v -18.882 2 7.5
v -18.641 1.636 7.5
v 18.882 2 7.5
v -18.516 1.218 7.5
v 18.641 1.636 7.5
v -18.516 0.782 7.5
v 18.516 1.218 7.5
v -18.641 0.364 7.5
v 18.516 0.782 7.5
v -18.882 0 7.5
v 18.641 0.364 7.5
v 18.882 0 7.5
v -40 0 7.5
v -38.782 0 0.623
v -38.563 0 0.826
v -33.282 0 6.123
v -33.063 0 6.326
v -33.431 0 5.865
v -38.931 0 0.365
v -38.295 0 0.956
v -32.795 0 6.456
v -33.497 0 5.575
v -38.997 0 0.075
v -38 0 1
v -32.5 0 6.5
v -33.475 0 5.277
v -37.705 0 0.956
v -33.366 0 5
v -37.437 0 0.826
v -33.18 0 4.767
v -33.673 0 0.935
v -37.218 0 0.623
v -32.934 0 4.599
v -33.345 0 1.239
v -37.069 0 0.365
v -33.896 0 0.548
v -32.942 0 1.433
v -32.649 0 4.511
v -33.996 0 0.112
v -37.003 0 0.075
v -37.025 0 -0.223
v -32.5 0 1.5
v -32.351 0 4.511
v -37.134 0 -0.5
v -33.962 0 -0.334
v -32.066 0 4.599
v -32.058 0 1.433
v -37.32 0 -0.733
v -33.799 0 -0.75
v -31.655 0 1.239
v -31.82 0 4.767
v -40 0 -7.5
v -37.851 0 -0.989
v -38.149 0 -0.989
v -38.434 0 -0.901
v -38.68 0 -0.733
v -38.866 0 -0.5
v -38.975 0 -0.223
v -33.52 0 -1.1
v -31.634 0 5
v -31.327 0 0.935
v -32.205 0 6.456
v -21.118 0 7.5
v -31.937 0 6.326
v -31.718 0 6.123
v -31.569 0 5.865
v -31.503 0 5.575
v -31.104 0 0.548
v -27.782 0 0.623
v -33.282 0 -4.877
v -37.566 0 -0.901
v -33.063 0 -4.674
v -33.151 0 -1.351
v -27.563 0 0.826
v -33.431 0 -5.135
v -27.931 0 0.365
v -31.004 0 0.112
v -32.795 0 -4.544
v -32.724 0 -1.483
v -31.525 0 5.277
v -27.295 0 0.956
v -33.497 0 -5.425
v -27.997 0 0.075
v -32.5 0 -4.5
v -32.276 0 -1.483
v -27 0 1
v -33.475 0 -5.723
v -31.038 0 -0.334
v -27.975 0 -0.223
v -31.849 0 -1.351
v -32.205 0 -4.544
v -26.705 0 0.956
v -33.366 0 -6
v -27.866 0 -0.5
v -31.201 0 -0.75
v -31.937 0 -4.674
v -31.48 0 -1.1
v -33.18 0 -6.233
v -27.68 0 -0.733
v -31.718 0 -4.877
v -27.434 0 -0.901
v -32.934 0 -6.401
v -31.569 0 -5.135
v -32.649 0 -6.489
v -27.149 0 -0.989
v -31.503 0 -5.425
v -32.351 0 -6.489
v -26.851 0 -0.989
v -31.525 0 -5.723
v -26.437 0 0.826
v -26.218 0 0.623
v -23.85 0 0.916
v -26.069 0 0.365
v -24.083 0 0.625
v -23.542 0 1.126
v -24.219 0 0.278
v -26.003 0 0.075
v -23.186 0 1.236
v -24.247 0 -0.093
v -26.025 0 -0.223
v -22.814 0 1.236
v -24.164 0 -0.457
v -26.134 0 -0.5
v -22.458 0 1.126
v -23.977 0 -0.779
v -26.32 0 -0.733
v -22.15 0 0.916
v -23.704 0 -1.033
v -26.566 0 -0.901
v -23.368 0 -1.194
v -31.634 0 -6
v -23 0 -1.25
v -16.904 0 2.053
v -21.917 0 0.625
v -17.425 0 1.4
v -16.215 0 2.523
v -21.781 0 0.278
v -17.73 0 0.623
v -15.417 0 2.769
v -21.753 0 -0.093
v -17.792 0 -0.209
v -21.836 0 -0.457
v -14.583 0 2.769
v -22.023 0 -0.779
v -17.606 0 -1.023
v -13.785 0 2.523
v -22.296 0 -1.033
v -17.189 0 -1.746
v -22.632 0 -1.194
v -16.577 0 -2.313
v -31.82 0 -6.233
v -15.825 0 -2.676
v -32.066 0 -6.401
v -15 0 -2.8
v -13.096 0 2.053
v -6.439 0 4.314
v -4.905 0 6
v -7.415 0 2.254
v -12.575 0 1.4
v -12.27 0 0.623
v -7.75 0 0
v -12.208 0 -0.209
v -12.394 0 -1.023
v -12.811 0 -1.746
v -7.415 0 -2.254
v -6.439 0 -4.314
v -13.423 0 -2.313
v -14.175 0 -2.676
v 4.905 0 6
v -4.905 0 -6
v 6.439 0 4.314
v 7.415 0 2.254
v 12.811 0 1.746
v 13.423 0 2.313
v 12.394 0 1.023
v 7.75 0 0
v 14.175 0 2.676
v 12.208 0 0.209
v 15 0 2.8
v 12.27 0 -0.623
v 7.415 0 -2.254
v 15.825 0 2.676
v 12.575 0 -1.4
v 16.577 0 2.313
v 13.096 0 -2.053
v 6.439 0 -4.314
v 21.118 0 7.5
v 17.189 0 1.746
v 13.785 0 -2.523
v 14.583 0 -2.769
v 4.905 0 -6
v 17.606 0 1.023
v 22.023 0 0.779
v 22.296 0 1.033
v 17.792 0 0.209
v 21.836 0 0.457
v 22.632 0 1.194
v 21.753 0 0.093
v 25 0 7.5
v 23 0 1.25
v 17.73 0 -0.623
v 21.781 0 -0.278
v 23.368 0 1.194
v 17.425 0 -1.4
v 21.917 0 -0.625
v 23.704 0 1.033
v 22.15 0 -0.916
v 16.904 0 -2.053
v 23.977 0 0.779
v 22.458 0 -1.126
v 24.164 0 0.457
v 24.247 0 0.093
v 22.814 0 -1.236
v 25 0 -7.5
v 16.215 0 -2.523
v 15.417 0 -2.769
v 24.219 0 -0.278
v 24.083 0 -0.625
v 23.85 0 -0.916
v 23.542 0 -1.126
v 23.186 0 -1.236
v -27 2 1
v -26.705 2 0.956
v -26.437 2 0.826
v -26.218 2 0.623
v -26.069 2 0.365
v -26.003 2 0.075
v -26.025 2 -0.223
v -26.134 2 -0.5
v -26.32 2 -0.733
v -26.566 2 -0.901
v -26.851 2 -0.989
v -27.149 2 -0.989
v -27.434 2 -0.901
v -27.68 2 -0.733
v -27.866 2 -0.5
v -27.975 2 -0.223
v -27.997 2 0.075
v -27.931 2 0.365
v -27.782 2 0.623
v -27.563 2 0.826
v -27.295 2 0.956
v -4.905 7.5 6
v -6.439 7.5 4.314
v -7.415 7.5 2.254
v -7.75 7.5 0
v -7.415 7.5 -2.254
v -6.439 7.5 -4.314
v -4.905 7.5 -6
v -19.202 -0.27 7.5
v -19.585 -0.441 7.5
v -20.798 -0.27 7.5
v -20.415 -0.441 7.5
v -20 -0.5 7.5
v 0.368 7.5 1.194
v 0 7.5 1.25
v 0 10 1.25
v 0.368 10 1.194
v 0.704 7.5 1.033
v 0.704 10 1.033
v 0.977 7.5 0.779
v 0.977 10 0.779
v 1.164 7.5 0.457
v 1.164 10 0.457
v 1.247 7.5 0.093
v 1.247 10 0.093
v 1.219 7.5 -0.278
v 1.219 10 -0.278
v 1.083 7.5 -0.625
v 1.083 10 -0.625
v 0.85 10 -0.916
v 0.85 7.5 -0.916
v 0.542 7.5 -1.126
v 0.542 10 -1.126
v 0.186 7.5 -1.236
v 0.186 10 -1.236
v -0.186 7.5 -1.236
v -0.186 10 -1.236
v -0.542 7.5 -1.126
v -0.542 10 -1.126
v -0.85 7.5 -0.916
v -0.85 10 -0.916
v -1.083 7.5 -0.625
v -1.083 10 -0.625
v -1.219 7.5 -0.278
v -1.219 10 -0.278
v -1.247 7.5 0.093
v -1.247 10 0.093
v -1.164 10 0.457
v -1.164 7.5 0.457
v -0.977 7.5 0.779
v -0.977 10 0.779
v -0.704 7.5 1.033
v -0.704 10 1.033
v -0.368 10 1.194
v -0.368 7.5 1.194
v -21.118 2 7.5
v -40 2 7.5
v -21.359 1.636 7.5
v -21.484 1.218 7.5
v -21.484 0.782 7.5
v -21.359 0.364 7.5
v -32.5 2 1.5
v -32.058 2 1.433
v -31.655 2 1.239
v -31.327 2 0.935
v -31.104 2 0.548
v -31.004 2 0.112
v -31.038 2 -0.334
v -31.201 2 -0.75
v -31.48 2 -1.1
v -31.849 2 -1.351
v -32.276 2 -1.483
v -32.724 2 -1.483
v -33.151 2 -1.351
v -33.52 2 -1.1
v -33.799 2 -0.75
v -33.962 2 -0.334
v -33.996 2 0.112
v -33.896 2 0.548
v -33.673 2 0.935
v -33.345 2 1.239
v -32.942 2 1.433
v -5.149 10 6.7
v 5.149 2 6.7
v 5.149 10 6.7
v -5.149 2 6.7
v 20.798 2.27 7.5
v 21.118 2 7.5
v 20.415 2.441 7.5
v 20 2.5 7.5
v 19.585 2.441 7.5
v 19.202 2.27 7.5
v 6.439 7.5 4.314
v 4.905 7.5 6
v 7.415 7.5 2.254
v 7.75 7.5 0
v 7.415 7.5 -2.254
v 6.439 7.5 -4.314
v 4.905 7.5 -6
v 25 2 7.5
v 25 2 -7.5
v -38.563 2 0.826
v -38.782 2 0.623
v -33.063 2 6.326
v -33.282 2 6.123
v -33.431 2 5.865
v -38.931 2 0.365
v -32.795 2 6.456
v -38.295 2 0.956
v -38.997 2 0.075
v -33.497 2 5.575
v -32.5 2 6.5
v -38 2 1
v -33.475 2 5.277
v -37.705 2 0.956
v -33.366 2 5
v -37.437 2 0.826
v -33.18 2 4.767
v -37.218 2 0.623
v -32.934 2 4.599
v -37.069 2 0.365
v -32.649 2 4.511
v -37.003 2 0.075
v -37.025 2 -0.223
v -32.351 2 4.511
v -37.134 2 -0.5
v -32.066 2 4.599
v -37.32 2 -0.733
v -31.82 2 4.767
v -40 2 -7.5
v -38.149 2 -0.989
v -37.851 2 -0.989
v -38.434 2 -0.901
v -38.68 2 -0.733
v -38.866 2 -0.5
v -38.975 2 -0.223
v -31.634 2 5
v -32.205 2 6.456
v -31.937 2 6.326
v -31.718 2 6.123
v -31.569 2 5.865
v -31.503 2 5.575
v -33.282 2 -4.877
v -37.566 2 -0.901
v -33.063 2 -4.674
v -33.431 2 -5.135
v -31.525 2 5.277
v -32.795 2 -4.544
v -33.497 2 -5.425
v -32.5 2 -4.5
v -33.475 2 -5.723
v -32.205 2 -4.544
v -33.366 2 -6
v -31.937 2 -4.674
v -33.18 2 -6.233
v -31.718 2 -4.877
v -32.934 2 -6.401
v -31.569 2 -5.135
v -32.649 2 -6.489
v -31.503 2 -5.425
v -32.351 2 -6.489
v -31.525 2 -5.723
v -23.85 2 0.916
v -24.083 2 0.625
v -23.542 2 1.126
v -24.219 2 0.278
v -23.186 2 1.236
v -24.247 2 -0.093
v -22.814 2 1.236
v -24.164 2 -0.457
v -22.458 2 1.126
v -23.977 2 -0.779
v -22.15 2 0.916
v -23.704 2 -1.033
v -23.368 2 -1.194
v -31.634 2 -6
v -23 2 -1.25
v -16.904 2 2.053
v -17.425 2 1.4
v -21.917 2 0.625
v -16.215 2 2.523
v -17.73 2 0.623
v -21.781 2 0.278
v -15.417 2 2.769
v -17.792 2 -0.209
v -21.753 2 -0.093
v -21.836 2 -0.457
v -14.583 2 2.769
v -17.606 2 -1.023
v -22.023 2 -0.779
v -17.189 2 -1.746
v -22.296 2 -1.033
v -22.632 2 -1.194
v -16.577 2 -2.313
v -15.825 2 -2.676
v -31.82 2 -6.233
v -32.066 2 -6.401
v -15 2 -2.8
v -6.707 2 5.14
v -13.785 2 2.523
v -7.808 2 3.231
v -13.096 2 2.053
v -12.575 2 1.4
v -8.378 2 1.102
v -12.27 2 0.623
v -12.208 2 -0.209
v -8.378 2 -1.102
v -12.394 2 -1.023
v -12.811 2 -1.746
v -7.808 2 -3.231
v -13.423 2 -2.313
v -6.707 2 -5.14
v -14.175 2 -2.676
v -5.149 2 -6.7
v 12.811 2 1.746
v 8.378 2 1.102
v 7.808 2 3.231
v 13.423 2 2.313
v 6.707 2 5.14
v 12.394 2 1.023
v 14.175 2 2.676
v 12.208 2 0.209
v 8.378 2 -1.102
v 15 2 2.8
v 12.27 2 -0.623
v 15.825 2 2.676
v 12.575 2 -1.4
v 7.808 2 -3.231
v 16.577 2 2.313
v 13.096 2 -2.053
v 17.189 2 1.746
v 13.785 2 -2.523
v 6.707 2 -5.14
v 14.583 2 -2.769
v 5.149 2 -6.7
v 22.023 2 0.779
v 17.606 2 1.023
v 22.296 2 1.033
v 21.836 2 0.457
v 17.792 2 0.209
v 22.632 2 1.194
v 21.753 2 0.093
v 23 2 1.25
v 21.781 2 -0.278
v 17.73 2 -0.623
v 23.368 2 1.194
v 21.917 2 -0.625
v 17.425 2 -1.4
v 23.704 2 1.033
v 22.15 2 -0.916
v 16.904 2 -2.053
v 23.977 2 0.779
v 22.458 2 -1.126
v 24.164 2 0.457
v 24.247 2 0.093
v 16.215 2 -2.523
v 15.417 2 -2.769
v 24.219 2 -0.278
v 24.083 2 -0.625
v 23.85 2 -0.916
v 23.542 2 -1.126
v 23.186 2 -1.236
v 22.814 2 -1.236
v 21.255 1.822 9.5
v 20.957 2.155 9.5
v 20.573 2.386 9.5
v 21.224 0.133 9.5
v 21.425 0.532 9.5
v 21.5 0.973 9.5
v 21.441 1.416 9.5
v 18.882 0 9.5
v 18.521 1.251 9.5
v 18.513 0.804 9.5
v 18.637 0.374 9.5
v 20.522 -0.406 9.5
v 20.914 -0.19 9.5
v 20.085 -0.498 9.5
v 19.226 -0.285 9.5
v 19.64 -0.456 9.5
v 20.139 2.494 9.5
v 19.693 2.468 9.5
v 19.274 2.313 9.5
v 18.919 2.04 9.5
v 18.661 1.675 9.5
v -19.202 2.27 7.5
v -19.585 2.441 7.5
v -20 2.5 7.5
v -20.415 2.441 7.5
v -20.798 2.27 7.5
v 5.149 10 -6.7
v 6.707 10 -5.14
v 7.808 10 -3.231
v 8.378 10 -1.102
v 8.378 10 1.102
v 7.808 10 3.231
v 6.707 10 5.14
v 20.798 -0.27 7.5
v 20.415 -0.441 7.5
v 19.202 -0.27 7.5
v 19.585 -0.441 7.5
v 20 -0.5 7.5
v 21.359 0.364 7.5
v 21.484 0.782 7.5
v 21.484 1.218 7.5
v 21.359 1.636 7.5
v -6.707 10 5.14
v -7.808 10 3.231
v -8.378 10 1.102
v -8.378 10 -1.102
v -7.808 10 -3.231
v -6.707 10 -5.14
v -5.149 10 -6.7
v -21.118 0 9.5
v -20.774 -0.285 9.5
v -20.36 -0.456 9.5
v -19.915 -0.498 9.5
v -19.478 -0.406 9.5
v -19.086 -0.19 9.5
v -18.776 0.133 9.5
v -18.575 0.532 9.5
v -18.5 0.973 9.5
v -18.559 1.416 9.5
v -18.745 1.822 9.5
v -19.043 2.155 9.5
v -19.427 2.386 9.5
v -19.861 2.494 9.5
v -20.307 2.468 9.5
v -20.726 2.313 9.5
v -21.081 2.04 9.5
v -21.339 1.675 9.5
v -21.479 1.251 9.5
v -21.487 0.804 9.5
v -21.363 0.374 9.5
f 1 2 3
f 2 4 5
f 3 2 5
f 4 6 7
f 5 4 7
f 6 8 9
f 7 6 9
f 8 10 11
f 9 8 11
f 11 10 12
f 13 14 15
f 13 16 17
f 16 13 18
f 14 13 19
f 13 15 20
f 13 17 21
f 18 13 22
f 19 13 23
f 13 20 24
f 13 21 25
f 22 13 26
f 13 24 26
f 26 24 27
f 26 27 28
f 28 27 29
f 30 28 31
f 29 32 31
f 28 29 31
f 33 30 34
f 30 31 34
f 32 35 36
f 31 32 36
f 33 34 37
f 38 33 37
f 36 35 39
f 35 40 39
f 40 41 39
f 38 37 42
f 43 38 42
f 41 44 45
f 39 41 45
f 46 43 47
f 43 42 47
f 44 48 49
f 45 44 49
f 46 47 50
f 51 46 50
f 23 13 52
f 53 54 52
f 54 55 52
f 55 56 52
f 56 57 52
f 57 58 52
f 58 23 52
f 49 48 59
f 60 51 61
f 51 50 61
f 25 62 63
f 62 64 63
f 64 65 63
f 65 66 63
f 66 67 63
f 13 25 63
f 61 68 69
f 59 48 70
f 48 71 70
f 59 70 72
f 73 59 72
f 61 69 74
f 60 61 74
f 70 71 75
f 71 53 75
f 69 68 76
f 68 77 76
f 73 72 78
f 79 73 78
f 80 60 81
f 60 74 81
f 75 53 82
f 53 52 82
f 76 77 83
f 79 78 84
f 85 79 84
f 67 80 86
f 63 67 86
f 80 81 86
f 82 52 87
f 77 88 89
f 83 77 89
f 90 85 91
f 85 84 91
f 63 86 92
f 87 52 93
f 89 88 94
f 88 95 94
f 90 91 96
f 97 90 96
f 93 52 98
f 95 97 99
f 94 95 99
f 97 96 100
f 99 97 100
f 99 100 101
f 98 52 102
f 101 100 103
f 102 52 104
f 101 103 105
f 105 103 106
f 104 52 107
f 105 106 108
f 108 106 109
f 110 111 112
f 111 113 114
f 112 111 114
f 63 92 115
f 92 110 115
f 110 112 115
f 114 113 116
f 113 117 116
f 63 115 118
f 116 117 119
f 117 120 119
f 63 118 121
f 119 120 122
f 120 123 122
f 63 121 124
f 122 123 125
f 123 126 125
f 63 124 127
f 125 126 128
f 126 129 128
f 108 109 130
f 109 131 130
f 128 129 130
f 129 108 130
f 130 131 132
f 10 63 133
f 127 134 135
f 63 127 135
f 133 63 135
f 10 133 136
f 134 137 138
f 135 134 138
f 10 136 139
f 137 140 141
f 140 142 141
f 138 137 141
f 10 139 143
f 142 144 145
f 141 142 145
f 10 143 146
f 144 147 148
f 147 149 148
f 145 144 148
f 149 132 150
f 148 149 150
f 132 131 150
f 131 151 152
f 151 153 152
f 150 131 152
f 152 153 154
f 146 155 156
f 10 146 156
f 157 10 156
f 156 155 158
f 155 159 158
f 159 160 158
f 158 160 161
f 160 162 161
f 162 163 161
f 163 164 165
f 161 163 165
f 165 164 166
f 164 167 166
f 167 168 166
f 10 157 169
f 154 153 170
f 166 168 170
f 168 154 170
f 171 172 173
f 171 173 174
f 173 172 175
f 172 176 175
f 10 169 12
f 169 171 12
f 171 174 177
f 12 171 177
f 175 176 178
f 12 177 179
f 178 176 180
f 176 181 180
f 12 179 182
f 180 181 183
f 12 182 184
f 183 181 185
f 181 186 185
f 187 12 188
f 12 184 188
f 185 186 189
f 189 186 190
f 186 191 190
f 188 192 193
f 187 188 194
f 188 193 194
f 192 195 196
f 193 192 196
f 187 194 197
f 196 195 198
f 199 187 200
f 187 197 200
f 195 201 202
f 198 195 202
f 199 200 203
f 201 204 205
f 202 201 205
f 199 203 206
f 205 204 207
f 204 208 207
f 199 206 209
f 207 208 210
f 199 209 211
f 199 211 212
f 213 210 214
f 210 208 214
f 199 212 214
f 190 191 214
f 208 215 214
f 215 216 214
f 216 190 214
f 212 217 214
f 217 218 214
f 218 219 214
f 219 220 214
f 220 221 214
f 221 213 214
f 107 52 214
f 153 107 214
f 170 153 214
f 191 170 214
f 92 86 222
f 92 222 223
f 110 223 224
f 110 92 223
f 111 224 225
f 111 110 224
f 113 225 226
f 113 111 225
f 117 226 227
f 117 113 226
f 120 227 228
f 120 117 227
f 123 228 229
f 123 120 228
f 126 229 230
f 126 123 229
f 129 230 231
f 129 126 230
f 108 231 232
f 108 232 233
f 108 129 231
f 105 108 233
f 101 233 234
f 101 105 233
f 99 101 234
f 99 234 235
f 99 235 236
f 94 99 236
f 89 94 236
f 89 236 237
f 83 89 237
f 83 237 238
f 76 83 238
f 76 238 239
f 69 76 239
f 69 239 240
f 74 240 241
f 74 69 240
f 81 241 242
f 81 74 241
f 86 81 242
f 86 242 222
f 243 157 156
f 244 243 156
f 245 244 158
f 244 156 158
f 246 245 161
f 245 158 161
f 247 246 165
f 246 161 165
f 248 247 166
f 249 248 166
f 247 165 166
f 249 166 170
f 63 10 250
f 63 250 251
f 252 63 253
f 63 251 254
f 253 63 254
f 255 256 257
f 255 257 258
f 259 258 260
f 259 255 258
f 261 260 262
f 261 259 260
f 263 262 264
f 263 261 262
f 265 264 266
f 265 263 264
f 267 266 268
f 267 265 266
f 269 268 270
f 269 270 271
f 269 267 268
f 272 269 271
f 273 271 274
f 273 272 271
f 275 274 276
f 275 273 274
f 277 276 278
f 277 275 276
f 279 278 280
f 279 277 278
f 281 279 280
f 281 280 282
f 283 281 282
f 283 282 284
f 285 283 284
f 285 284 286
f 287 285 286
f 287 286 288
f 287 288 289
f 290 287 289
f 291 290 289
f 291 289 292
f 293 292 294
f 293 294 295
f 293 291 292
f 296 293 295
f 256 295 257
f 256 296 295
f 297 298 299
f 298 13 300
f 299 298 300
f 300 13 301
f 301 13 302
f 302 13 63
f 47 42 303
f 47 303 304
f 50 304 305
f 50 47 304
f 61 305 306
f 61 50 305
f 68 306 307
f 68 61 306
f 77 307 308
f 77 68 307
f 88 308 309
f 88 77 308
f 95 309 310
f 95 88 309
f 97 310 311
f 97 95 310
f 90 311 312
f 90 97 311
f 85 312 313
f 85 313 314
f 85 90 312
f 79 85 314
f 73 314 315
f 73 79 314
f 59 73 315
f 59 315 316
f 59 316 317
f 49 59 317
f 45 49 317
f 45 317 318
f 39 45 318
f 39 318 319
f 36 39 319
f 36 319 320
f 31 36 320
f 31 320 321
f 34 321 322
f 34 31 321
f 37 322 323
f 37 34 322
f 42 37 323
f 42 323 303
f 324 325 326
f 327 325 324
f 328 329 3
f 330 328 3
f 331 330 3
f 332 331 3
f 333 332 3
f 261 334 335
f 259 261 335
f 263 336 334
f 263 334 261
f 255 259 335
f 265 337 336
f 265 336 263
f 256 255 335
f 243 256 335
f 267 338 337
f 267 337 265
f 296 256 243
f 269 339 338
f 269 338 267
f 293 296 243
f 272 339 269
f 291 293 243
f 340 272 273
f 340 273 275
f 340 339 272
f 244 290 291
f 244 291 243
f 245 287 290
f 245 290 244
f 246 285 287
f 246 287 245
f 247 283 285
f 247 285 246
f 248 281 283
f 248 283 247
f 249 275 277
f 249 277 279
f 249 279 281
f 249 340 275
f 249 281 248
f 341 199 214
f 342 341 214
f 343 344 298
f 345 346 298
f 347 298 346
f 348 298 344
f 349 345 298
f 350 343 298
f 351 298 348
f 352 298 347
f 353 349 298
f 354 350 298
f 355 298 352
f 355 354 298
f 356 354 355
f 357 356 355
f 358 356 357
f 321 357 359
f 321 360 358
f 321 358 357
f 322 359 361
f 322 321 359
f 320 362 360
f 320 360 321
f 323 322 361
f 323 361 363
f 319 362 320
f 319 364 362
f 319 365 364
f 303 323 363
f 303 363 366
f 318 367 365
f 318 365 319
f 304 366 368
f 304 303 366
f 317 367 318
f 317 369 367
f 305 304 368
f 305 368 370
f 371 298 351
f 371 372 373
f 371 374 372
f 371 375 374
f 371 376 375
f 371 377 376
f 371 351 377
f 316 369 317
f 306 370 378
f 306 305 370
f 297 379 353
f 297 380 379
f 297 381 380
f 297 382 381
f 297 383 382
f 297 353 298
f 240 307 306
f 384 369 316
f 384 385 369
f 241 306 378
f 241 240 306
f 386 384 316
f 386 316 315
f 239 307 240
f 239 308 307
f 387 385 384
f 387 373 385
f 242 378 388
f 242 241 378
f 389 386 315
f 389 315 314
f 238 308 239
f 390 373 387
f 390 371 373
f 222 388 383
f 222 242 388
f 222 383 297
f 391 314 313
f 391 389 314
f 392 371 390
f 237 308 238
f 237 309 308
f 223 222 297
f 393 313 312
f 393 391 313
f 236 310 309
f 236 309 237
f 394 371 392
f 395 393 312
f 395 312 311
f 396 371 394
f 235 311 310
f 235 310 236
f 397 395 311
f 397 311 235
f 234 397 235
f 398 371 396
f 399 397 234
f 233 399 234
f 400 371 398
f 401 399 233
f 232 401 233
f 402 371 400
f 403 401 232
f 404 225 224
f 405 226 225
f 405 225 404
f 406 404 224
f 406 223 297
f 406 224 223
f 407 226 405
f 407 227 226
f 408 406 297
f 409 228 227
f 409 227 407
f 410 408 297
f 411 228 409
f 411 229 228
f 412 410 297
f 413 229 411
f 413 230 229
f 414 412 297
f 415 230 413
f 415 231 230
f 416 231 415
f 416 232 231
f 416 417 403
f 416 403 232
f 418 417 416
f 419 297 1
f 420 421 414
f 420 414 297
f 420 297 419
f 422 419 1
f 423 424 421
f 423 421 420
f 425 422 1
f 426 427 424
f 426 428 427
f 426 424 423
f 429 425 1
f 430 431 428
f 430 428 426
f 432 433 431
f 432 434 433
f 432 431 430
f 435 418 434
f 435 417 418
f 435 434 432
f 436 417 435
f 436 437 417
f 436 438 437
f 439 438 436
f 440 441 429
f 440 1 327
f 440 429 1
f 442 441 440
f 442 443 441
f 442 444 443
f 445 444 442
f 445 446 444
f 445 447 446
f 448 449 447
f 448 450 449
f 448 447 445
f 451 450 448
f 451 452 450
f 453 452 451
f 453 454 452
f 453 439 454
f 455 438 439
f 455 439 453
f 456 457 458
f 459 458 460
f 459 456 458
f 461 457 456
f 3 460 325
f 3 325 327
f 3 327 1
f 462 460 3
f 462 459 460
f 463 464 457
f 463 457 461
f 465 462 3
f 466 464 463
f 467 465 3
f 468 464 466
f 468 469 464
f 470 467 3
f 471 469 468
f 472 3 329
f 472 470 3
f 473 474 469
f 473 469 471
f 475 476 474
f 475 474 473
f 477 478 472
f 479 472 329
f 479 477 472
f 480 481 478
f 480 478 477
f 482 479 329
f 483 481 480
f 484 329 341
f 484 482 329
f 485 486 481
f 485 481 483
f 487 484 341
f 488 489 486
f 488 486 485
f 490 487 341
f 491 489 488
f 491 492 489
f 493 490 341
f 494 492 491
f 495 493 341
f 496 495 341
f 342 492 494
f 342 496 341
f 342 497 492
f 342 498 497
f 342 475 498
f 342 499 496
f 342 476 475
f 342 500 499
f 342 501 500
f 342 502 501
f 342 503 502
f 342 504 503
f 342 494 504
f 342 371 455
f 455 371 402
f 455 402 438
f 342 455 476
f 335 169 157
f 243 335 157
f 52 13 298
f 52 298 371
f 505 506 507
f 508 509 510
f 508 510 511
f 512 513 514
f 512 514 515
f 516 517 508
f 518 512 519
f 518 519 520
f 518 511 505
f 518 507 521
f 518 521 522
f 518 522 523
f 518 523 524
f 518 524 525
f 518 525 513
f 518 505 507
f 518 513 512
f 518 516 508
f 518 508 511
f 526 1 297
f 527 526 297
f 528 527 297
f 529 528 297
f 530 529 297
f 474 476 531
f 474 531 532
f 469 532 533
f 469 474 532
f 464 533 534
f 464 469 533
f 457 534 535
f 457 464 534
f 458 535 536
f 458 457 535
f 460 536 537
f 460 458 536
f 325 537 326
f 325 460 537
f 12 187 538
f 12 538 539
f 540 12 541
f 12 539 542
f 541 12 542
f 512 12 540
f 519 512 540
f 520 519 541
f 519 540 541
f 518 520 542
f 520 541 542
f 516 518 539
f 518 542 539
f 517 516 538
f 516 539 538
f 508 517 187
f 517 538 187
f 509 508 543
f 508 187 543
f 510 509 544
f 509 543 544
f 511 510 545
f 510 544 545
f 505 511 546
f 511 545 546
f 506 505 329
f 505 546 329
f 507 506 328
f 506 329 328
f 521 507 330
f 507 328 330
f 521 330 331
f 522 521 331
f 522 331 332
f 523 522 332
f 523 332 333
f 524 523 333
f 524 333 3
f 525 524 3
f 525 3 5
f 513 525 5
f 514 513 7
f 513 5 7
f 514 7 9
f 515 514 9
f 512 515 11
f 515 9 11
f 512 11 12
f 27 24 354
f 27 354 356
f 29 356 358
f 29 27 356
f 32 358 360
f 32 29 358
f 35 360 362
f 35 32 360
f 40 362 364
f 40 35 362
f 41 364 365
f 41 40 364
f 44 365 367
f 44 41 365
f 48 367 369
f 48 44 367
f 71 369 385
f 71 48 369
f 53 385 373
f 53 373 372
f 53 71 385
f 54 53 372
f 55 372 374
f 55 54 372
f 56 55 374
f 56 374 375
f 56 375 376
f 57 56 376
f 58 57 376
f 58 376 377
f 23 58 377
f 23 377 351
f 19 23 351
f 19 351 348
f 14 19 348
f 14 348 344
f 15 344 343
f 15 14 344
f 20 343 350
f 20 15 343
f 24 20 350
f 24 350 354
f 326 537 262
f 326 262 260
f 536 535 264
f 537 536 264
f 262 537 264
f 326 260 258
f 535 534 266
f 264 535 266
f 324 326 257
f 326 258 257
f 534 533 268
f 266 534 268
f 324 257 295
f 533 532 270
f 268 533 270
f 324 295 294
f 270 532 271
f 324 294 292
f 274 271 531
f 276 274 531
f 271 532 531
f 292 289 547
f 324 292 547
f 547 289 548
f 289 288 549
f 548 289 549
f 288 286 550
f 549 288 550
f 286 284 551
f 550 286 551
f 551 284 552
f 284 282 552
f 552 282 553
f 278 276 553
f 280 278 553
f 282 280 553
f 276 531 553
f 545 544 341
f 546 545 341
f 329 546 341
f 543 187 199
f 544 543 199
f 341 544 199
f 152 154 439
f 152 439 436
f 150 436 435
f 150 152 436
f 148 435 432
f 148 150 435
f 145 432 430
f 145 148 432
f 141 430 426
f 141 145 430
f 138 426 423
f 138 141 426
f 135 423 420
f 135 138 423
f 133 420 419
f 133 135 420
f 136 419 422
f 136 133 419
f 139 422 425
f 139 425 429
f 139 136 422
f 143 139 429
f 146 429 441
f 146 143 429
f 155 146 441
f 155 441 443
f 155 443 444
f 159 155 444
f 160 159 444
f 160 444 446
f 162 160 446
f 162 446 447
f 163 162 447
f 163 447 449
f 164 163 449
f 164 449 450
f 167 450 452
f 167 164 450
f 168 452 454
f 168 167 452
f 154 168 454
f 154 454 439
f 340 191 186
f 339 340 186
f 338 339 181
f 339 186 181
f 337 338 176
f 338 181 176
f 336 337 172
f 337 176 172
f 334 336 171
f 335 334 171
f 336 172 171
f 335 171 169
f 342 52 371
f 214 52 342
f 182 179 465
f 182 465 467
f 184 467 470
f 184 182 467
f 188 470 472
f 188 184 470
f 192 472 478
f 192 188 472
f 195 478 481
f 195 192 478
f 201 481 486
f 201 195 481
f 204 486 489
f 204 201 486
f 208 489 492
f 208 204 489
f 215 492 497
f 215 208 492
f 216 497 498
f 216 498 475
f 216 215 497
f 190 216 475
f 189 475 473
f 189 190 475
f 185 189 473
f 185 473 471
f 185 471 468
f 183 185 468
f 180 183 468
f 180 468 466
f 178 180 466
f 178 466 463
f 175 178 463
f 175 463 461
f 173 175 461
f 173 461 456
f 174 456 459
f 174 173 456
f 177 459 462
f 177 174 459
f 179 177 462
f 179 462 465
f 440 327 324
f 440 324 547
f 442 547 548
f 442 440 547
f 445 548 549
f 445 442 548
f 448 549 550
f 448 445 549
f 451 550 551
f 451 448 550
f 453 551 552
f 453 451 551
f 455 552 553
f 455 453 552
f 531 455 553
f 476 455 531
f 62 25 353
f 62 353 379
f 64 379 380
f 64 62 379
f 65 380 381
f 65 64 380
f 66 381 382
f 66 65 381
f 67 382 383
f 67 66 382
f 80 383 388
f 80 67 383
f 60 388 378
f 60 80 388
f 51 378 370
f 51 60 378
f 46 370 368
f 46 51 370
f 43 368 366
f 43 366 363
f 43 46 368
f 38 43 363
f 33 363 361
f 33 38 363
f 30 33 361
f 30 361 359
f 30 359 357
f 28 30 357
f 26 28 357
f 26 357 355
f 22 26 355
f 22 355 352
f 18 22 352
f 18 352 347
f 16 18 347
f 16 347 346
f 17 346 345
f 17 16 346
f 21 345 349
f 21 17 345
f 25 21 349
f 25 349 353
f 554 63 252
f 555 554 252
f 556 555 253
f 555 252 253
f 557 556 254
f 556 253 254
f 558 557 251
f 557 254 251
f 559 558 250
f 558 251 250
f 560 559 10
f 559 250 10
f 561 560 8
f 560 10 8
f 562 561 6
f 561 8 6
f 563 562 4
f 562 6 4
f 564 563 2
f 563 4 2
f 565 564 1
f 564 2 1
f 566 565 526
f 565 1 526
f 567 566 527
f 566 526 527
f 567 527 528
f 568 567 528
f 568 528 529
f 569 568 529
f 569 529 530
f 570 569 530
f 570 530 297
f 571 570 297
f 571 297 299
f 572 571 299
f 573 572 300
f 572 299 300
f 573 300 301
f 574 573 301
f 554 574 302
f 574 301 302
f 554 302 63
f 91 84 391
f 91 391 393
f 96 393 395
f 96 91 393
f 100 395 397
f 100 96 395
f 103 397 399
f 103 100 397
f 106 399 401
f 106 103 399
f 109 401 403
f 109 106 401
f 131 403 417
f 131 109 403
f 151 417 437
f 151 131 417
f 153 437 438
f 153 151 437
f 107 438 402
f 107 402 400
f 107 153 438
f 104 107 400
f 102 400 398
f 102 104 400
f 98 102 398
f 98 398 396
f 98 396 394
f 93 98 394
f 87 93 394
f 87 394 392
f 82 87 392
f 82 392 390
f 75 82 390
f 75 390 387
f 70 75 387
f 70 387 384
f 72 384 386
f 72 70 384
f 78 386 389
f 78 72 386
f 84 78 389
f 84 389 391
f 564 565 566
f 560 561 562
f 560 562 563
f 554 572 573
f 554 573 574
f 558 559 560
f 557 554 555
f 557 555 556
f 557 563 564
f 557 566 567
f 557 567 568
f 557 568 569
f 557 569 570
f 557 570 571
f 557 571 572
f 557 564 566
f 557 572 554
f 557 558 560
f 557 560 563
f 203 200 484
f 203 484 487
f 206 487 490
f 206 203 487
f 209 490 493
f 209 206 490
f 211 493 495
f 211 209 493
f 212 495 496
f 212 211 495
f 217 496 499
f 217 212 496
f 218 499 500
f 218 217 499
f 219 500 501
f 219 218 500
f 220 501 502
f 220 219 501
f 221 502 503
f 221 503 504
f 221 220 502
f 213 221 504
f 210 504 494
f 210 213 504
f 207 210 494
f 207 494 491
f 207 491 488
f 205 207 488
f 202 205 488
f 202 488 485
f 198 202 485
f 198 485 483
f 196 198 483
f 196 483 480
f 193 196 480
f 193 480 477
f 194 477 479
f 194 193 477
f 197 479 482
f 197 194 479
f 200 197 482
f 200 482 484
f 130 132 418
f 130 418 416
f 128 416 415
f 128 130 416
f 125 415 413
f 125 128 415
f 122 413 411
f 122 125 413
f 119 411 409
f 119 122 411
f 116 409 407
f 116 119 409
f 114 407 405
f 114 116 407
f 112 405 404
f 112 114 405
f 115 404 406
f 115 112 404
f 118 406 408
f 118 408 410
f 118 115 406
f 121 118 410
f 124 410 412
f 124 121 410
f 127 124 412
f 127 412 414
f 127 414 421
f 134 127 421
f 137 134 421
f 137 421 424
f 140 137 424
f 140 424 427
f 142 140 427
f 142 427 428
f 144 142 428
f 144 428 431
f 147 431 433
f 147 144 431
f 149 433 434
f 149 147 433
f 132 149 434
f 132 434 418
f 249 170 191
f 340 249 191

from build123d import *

# Parameters (mm, degrees)
SKETCH_1_W               = 65
SKETCH_1_H               = 15
EXTRUDE_1_DEPTH          = 2
SKETCH_2_R               = 1.25
SKETCH_2_R_2             = 2.8
SKETCH_2_R_3             = 1.5
SKETCH_2_R_4             = 1
CUT_EXTRUDE_1_DEPTH      = 2
SKETCH_4_R               = 1.5
EXTRUDE_2_DEPTH          = 2
EXTRUDE_3_DEPTH          = 8
SKETCH_5_8_R             = 1.25
EXTRUDE_4_DEPTH          = 8
CUT_EXTRUDE_2_DEPTH      = 5.5
CUT_EXTRUDE_2_DEPTH_BACK = 42.883767739
SKETCH_5_11_R            = 1.25


with BuildPart() as part:
    # 草图1 → 凸台-拉伸1 (new body)
    with BuildSketch(Plane(origin=(0, 0, 0), x_dir=(1, 0, 0), z_dir=(0, 1, 0))):
        with Locations((-7.5, 0)):
            Rectangle(SKETCH_1_W, SKETCH_1_H)
    extrude(amount=EXTRUDE_1_DEPTH)

    # 草图2 → 切除-拉伸1 (cut)
    with BuildSketch(Plane(origin=(0, 0, 0), x_dir=(1, 0, 0), z_dir=(0, 1, 0))):
        with Locations(Location((0, 0, 0), (0, 0, 270))):
            Circle(SKETCH_2_R)
        with Locations(Location((15, 0, 0), (0, 0, 270))):
            Circle(SKETCH_2_R_2)
        with Locations(Location((-15, 0, 0), (0, 0, 90))):
            Circle(SKETCH_2_R_2)
        with Locations(Location((23, 0, 0), (0, 0, 270))):
            Circle(SKETCH_2_R)
        with Locations(Location((-23, 0, 0), (0, 0, 90))):
            Circle(SKETCH_2_R)
        with Locations(Location((-32.5, 0, 0), (0, 0, 270))):
            Circle(SKETCH_2_R_3)
        with Locations(Location((-27, 0, 0), (0, 0, 270))):
            Circle(SKETCH_2_R_4)
        with Locations(Location((-32.5, -5.5, 0), (0, 0, 270))):
            Circle(SKETCH_2_R_4)
        with Locations(Location((-38, 0, 0), (0, 0, 270))):
            Circle(SKETCH_2_R_4)
        with Locations(Location((-32.5, 5.5, 0), (0, 0, 270))):
            Circle(SKETCH_2_R_4)
    extrude(amount=CUT_EXTRUDE_1_DEPTH, mode=Mode.SUBTRACT)

    # 草图4 → 凸台-拉伸2 (add)
    with BuildSketch(Plane.XY.offset(7.5)):
        with Locations(Location((20, 1, 0), (0, 0, 221.810314896))):
            Circle(SKETCH_4_R)
        with Locations(Location((-20, 1, 0), (0, 0, 221.810314896))):
            Circle(SKETCH_4_R)
    extrude(amount=EXTRUDE_2_DEPTH)

    # 草图5 → 凸台-拉伸3 (add)
    with BuildSketch(Plane(origin=(0, 2, 0), x_dir=(1, 0, 0), z_dir=(0, 1, 0))):
        with BuildLine():
            Line((5.149029035, -6.7), (-5.149029035, -6.7))
            ThreePointArc((-5.149029035, -6.7), (-8.45, 0), (-5.149029035, 6.7))
            Line((-5.149029035, 6.7), (5.149029035, 6.7))
            ThreePointArc((5.149029035, 6.7), (8.45, 0), (5.149029035, -6.7))
        make_face()
        with BuildLine():
            Line((4.905354218, -6), (-4.905354218, -6))
            ThreePointArc((-4.905354218, -6), (-7.75, 0), (-4.905354218, 6))
            Line((-4.905354218, 6), (4.905354218, 6))
            ThreePointArc((4.905354218, 6), (7.75, 0), (4.905354218, -6))
        make_face(mode=Mode.SUBTRACT)
    extrude(amount=EXTRUDE_3_DEPTH)

    # 草图5<8> → 凸台-拉伸4 (add)
    with BuildSketch(Plane(origin=(0, 2, 0), x_dir=(1, 0, 0), z_dir=(0, 1, 0))):
        with BuildLine():
            Line((4.905354218, -6), (-4.905354218, -6))
            ThreePointArc((-4.905354218, -6), (-7.75, 0), (-4.905354218, 6))
            Line((-4.905354218, 6), (4.905354218, 6))
            ThreePointArc((4.905354218, 6), (7.75, 0), (4.905354218, -6))
        make_face()
        with Locations(Location((0, 0, 0), (0, 0, 270))):
            Circle(SKETCH_5_8_R, mode=Mode.SUBTRACT)
    extrude(amount=EXTRUDE_4_DEPTH)

    # 草图5<11> → 切除-拉伸2 (cut, two sides: drawn at the far end of the back side and taken through both)
    with BuildSketch(Plane(origin=(0, 2, 0), x_dir=(1, 0, 0), z_dir=(0, 1, 0)).offset(-CUT_EXTRUDE_2_DEPTH_BACK)):
        with BuildLine():
            Line((4.905354218, -6), (-4.905354218, -6))
            ThreePointArc((-4.905354218, -6), (-7.75, 0), (-4.905354218, 6))
            Line((-4.905354218, 6), (4.905354218, 6))
            ThreePointArc((4.905354218, 6), (7.75, 0), (4.905354218, -6))
        make_face()
        with Locations(Location((0, 0, 0), (0, 0, 270))):
            Circle(SKETCH_5_11_R, mode=Mode.SUBTRACT)
    extrude(amount=CUT_EXTRUDE_2_DEPTH + CUT_EXTRUDE_2_DEPTH_BACK, mode=Mode.SUBTRACT)


solid = part.part
